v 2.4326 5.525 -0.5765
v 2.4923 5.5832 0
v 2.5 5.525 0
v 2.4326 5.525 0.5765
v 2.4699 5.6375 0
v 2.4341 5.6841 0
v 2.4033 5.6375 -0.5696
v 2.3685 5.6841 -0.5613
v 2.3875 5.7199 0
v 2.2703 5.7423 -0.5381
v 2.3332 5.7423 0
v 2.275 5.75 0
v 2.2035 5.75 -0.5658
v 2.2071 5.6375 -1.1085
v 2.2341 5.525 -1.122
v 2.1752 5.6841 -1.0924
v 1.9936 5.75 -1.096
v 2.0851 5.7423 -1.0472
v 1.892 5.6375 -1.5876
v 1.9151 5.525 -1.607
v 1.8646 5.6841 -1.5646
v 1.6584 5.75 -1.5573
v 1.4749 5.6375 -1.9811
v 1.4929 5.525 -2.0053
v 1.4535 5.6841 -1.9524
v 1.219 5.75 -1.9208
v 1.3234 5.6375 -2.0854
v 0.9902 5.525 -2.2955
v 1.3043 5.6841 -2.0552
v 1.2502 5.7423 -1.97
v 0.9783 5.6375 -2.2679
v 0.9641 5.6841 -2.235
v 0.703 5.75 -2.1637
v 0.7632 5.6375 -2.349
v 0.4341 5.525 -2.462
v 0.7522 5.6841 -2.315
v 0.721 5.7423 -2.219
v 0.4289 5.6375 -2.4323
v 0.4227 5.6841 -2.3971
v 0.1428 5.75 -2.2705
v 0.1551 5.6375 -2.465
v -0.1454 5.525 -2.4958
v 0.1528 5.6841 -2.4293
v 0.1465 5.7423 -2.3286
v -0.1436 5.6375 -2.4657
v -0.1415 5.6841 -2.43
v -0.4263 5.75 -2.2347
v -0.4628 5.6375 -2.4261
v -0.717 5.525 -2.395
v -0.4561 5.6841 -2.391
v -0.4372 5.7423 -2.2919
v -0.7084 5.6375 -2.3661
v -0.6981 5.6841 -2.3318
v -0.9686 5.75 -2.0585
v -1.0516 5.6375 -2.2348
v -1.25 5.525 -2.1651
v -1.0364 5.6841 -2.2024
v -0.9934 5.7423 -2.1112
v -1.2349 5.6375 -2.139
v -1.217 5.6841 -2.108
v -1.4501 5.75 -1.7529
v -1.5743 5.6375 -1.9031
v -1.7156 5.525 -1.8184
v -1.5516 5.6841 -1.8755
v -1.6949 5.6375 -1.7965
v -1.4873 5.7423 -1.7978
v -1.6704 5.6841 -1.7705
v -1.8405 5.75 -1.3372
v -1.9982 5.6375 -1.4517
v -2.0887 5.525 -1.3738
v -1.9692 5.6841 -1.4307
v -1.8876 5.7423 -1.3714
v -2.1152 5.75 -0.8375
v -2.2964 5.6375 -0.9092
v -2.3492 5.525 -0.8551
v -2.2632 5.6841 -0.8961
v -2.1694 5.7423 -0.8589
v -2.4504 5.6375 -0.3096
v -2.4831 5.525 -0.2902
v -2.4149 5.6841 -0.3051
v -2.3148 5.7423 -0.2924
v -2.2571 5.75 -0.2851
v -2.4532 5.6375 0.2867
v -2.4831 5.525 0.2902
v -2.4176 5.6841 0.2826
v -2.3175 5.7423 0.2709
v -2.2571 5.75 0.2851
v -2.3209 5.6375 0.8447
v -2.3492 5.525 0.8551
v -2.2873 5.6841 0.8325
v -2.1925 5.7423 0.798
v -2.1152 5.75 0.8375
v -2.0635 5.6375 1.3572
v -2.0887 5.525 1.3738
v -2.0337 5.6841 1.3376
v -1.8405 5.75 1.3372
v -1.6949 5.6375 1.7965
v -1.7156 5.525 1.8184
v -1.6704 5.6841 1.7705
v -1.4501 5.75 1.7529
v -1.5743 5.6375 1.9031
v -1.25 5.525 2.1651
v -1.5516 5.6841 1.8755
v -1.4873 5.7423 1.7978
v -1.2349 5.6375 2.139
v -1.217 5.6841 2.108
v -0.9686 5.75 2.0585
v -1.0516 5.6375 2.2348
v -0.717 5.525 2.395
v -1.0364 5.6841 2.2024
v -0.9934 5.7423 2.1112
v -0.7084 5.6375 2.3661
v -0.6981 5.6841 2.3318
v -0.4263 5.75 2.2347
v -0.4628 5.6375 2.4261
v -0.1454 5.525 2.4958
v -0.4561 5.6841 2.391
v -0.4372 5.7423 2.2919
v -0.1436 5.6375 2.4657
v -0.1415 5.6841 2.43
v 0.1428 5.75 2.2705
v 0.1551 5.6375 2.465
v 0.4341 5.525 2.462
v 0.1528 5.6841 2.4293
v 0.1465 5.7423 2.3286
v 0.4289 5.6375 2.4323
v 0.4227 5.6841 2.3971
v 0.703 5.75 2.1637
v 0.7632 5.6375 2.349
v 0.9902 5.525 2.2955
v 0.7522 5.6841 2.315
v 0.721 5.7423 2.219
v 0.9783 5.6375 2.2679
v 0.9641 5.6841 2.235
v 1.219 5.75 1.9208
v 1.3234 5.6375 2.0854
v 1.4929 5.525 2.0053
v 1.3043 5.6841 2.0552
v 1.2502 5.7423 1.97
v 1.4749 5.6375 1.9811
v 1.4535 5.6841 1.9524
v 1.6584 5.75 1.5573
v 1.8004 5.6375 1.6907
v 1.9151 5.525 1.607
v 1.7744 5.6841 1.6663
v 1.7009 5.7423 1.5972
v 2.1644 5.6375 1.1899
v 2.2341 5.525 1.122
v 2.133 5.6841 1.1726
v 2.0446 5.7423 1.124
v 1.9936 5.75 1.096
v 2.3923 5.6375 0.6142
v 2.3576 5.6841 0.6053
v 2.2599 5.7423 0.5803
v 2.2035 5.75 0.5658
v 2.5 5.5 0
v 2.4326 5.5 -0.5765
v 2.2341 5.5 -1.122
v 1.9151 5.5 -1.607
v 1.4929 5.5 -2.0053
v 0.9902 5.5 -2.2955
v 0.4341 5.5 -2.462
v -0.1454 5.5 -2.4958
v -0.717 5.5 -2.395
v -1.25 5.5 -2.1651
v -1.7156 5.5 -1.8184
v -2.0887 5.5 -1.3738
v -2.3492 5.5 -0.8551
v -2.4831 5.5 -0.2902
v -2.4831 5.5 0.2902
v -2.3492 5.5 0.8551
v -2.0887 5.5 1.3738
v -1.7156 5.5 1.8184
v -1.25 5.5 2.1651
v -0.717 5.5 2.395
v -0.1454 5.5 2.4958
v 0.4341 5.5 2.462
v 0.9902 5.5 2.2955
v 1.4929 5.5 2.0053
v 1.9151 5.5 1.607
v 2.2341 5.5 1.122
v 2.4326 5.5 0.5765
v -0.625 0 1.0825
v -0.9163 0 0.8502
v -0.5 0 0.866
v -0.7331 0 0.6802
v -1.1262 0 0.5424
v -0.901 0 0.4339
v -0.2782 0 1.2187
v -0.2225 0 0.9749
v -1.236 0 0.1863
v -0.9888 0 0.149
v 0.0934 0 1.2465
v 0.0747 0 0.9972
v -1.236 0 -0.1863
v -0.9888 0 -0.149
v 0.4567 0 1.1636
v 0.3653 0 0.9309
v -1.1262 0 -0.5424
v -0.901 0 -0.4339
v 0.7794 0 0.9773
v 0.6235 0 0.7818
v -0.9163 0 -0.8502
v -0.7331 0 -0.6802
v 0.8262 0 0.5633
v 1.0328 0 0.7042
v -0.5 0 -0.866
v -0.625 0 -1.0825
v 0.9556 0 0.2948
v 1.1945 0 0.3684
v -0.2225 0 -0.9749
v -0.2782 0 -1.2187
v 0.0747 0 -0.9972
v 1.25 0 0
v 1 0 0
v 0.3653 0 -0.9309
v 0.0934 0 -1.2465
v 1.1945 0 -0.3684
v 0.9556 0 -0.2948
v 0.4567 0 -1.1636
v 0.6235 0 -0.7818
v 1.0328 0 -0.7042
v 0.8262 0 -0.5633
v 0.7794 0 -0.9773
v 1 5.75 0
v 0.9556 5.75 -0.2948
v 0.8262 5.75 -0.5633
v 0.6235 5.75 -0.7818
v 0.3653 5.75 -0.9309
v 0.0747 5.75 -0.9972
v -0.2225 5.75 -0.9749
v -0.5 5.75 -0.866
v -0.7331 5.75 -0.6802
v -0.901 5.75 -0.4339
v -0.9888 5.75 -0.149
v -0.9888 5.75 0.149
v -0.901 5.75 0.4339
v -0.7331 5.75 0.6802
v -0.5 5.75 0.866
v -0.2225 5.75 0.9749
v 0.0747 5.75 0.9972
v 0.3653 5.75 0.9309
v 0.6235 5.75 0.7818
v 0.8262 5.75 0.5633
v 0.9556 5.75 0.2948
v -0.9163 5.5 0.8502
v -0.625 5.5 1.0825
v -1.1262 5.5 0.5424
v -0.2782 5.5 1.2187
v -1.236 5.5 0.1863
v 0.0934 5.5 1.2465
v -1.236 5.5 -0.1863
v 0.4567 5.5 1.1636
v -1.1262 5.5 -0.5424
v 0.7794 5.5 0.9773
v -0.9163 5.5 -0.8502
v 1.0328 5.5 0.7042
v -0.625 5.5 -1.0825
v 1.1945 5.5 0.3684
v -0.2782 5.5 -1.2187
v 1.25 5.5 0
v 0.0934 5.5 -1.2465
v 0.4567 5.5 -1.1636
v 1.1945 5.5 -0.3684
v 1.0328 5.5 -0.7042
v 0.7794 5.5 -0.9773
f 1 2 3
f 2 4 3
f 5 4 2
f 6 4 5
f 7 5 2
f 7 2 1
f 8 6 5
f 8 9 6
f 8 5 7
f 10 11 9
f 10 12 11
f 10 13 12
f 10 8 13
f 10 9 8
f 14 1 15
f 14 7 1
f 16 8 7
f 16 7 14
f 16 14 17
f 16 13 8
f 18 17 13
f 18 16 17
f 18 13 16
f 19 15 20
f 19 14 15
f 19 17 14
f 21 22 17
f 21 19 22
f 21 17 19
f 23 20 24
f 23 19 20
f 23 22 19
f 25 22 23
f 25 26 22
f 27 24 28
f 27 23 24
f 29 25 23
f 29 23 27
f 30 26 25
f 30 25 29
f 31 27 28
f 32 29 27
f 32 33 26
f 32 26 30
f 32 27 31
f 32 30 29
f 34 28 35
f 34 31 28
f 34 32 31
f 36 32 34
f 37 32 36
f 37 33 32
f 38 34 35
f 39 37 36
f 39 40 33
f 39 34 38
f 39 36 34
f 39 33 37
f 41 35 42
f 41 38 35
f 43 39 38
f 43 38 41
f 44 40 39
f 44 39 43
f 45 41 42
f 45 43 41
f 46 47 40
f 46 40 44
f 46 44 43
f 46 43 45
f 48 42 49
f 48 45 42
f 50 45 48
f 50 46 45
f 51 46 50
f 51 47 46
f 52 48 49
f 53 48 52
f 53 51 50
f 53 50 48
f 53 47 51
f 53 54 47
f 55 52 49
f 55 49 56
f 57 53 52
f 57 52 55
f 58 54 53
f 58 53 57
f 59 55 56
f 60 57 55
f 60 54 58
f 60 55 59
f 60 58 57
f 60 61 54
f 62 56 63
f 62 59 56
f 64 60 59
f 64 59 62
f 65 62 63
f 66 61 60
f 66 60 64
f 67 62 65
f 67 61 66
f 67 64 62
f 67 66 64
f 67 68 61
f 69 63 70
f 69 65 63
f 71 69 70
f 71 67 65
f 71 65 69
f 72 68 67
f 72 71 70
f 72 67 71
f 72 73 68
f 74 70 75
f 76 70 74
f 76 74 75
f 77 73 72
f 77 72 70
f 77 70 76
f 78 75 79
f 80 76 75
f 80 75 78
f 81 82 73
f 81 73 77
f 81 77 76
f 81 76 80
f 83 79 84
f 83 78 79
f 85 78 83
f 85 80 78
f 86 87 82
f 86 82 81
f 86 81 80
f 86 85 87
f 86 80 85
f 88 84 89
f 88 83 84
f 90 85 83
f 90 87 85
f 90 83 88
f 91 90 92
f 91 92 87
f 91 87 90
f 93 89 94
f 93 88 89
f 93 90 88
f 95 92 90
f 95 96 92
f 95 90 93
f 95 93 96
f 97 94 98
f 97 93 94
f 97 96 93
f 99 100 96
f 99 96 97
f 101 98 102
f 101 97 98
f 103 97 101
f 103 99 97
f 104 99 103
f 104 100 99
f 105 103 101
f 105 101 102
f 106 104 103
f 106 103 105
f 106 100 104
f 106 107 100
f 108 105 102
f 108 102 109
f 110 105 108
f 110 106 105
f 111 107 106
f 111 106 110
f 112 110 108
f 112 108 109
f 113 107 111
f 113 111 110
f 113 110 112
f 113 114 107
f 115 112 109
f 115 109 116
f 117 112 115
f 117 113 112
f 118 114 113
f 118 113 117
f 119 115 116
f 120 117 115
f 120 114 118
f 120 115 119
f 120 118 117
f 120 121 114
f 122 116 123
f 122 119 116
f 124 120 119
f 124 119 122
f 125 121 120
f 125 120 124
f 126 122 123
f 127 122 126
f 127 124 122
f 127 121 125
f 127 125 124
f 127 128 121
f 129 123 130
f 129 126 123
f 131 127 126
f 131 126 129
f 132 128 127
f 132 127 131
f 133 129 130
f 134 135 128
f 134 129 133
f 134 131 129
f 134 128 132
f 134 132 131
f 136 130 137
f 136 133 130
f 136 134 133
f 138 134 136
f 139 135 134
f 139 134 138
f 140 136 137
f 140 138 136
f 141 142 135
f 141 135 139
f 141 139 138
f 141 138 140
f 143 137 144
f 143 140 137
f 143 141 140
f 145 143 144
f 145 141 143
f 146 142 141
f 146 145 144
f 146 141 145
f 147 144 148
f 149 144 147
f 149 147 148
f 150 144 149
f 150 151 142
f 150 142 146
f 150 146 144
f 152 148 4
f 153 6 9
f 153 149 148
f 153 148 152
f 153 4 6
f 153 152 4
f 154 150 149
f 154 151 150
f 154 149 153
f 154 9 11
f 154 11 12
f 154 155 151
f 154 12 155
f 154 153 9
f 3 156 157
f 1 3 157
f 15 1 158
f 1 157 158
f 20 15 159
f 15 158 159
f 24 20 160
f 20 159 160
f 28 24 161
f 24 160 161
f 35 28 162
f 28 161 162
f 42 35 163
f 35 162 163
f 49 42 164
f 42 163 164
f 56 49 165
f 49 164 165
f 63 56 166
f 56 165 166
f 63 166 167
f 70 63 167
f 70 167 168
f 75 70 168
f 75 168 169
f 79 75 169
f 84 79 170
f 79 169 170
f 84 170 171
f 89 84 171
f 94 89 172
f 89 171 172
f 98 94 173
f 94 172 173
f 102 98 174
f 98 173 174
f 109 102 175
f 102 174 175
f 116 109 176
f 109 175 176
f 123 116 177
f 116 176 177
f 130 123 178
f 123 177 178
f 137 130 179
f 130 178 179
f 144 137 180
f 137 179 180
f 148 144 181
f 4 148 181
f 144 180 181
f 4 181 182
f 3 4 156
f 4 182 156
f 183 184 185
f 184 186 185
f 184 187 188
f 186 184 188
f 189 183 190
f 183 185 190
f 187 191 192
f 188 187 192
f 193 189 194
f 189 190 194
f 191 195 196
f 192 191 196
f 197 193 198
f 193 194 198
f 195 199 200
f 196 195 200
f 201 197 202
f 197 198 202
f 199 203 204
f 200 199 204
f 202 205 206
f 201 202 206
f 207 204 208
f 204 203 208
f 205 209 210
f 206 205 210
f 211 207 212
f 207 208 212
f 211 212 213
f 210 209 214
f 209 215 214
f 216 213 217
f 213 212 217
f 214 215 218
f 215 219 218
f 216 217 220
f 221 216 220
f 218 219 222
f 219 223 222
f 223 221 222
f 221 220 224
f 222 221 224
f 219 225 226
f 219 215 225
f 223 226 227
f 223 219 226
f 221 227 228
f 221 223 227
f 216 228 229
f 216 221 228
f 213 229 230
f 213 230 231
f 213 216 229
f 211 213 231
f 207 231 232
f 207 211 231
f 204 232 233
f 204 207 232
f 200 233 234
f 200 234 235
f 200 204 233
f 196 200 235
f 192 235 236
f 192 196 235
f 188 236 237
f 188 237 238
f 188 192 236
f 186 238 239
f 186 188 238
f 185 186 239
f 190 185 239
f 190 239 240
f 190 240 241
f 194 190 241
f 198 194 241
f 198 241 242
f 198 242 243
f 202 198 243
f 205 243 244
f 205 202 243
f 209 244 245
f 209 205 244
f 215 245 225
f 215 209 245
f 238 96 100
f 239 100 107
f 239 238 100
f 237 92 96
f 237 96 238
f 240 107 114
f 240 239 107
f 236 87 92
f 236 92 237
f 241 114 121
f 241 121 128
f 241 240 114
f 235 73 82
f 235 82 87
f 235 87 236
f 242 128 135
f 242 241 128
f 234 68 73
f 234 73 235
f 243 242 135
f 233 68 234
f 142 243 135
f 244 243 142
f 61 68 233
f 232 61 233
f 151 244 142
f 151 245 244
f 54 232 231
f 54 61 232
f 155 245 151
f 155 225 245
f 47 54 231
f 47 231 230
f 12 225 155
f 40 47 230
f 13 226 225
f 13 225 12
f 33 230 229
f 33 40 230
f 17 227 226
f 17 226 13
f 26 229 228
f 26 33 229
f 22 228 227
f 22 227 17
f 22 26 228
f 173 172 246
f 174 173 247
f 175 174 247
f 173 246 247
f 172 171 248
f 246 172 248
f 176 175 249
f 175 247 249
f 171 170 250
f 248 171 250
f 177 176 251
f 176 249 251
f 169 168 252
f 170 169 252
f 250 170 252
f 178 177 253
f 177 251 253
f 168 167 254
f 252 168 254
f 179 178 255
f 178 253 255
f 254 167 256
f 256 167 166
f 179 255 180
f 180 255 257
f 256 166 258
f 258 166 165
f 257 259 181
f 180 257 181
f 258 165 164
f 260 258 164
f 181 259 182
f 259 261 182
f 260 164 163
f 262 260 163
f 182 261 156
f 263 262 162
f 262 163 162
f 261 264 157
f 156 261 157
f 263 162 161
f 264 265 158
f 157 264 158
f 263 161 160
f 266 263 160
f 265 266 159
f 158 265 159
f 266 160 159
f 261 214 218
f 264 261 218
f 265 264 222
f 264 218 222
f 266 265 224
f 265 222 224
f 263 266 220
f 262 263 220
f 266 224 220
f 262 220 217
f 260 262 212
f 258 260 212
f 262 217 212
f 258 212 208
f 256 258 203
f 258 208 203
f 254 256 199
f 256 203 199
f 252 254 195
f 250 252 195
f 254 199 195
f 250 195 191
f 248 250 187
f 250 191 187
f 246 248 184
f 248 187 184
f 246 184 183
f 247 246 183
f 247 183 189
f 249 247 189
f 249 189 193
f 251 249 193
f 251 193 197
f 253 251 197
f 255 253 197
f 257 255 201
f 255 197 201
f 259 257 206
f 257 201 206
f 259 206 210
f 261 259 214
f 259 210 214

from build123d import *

# Parameters (mm, degrees)
SKETCH1_R           = 1.25
SKETCH1_R_2         = 1
BOSS_EXTRUDE1_DEPTH = 5.5
SKETCH2_R           = 2.5
SKETCH2_R_2         = 1
BOSS_EXTRUDE2_DEPTH = 0.25
FILLET1_R           = 0.225


with BuildPart() as part:
    # Sketch1 → Boss-Extrude1 (new body)
    with BuildSketch(Plane(origin=(0, 0, 0), x_dir=(1, 0, 0), z_dir=(0, 1, 0))):
        Circle(SKETCH1_R)
        Circle(SKETCH1_R_2, mode=Mode.SUBTRACT)
    extrude(amount=BOSS_EXTRUDE1_DEPTH)

    # Sketch2 → Boss-Extrude2 (add)
    with BuildSketch(Plane(origin=(0, 5.5, 0), x_dir=(1, 0, 0), z_dir=(0, 1, 0))):
        Circle(SKETCH2_R)
        Circle(SKETCH2_R_2, mode=Mode.SUBTRACT)
    extrude(amount=BOSS_EXTRUDE2_DEPTH)

    # Fillet1
    fillet1_edges = [part.edges().sort_by_distance(p)[0] for p in [
        (-2.5, 5.75, 0),
    ]]
    fillet(fillet1_edges, radius=FILLET1_R)


solid = part.part
